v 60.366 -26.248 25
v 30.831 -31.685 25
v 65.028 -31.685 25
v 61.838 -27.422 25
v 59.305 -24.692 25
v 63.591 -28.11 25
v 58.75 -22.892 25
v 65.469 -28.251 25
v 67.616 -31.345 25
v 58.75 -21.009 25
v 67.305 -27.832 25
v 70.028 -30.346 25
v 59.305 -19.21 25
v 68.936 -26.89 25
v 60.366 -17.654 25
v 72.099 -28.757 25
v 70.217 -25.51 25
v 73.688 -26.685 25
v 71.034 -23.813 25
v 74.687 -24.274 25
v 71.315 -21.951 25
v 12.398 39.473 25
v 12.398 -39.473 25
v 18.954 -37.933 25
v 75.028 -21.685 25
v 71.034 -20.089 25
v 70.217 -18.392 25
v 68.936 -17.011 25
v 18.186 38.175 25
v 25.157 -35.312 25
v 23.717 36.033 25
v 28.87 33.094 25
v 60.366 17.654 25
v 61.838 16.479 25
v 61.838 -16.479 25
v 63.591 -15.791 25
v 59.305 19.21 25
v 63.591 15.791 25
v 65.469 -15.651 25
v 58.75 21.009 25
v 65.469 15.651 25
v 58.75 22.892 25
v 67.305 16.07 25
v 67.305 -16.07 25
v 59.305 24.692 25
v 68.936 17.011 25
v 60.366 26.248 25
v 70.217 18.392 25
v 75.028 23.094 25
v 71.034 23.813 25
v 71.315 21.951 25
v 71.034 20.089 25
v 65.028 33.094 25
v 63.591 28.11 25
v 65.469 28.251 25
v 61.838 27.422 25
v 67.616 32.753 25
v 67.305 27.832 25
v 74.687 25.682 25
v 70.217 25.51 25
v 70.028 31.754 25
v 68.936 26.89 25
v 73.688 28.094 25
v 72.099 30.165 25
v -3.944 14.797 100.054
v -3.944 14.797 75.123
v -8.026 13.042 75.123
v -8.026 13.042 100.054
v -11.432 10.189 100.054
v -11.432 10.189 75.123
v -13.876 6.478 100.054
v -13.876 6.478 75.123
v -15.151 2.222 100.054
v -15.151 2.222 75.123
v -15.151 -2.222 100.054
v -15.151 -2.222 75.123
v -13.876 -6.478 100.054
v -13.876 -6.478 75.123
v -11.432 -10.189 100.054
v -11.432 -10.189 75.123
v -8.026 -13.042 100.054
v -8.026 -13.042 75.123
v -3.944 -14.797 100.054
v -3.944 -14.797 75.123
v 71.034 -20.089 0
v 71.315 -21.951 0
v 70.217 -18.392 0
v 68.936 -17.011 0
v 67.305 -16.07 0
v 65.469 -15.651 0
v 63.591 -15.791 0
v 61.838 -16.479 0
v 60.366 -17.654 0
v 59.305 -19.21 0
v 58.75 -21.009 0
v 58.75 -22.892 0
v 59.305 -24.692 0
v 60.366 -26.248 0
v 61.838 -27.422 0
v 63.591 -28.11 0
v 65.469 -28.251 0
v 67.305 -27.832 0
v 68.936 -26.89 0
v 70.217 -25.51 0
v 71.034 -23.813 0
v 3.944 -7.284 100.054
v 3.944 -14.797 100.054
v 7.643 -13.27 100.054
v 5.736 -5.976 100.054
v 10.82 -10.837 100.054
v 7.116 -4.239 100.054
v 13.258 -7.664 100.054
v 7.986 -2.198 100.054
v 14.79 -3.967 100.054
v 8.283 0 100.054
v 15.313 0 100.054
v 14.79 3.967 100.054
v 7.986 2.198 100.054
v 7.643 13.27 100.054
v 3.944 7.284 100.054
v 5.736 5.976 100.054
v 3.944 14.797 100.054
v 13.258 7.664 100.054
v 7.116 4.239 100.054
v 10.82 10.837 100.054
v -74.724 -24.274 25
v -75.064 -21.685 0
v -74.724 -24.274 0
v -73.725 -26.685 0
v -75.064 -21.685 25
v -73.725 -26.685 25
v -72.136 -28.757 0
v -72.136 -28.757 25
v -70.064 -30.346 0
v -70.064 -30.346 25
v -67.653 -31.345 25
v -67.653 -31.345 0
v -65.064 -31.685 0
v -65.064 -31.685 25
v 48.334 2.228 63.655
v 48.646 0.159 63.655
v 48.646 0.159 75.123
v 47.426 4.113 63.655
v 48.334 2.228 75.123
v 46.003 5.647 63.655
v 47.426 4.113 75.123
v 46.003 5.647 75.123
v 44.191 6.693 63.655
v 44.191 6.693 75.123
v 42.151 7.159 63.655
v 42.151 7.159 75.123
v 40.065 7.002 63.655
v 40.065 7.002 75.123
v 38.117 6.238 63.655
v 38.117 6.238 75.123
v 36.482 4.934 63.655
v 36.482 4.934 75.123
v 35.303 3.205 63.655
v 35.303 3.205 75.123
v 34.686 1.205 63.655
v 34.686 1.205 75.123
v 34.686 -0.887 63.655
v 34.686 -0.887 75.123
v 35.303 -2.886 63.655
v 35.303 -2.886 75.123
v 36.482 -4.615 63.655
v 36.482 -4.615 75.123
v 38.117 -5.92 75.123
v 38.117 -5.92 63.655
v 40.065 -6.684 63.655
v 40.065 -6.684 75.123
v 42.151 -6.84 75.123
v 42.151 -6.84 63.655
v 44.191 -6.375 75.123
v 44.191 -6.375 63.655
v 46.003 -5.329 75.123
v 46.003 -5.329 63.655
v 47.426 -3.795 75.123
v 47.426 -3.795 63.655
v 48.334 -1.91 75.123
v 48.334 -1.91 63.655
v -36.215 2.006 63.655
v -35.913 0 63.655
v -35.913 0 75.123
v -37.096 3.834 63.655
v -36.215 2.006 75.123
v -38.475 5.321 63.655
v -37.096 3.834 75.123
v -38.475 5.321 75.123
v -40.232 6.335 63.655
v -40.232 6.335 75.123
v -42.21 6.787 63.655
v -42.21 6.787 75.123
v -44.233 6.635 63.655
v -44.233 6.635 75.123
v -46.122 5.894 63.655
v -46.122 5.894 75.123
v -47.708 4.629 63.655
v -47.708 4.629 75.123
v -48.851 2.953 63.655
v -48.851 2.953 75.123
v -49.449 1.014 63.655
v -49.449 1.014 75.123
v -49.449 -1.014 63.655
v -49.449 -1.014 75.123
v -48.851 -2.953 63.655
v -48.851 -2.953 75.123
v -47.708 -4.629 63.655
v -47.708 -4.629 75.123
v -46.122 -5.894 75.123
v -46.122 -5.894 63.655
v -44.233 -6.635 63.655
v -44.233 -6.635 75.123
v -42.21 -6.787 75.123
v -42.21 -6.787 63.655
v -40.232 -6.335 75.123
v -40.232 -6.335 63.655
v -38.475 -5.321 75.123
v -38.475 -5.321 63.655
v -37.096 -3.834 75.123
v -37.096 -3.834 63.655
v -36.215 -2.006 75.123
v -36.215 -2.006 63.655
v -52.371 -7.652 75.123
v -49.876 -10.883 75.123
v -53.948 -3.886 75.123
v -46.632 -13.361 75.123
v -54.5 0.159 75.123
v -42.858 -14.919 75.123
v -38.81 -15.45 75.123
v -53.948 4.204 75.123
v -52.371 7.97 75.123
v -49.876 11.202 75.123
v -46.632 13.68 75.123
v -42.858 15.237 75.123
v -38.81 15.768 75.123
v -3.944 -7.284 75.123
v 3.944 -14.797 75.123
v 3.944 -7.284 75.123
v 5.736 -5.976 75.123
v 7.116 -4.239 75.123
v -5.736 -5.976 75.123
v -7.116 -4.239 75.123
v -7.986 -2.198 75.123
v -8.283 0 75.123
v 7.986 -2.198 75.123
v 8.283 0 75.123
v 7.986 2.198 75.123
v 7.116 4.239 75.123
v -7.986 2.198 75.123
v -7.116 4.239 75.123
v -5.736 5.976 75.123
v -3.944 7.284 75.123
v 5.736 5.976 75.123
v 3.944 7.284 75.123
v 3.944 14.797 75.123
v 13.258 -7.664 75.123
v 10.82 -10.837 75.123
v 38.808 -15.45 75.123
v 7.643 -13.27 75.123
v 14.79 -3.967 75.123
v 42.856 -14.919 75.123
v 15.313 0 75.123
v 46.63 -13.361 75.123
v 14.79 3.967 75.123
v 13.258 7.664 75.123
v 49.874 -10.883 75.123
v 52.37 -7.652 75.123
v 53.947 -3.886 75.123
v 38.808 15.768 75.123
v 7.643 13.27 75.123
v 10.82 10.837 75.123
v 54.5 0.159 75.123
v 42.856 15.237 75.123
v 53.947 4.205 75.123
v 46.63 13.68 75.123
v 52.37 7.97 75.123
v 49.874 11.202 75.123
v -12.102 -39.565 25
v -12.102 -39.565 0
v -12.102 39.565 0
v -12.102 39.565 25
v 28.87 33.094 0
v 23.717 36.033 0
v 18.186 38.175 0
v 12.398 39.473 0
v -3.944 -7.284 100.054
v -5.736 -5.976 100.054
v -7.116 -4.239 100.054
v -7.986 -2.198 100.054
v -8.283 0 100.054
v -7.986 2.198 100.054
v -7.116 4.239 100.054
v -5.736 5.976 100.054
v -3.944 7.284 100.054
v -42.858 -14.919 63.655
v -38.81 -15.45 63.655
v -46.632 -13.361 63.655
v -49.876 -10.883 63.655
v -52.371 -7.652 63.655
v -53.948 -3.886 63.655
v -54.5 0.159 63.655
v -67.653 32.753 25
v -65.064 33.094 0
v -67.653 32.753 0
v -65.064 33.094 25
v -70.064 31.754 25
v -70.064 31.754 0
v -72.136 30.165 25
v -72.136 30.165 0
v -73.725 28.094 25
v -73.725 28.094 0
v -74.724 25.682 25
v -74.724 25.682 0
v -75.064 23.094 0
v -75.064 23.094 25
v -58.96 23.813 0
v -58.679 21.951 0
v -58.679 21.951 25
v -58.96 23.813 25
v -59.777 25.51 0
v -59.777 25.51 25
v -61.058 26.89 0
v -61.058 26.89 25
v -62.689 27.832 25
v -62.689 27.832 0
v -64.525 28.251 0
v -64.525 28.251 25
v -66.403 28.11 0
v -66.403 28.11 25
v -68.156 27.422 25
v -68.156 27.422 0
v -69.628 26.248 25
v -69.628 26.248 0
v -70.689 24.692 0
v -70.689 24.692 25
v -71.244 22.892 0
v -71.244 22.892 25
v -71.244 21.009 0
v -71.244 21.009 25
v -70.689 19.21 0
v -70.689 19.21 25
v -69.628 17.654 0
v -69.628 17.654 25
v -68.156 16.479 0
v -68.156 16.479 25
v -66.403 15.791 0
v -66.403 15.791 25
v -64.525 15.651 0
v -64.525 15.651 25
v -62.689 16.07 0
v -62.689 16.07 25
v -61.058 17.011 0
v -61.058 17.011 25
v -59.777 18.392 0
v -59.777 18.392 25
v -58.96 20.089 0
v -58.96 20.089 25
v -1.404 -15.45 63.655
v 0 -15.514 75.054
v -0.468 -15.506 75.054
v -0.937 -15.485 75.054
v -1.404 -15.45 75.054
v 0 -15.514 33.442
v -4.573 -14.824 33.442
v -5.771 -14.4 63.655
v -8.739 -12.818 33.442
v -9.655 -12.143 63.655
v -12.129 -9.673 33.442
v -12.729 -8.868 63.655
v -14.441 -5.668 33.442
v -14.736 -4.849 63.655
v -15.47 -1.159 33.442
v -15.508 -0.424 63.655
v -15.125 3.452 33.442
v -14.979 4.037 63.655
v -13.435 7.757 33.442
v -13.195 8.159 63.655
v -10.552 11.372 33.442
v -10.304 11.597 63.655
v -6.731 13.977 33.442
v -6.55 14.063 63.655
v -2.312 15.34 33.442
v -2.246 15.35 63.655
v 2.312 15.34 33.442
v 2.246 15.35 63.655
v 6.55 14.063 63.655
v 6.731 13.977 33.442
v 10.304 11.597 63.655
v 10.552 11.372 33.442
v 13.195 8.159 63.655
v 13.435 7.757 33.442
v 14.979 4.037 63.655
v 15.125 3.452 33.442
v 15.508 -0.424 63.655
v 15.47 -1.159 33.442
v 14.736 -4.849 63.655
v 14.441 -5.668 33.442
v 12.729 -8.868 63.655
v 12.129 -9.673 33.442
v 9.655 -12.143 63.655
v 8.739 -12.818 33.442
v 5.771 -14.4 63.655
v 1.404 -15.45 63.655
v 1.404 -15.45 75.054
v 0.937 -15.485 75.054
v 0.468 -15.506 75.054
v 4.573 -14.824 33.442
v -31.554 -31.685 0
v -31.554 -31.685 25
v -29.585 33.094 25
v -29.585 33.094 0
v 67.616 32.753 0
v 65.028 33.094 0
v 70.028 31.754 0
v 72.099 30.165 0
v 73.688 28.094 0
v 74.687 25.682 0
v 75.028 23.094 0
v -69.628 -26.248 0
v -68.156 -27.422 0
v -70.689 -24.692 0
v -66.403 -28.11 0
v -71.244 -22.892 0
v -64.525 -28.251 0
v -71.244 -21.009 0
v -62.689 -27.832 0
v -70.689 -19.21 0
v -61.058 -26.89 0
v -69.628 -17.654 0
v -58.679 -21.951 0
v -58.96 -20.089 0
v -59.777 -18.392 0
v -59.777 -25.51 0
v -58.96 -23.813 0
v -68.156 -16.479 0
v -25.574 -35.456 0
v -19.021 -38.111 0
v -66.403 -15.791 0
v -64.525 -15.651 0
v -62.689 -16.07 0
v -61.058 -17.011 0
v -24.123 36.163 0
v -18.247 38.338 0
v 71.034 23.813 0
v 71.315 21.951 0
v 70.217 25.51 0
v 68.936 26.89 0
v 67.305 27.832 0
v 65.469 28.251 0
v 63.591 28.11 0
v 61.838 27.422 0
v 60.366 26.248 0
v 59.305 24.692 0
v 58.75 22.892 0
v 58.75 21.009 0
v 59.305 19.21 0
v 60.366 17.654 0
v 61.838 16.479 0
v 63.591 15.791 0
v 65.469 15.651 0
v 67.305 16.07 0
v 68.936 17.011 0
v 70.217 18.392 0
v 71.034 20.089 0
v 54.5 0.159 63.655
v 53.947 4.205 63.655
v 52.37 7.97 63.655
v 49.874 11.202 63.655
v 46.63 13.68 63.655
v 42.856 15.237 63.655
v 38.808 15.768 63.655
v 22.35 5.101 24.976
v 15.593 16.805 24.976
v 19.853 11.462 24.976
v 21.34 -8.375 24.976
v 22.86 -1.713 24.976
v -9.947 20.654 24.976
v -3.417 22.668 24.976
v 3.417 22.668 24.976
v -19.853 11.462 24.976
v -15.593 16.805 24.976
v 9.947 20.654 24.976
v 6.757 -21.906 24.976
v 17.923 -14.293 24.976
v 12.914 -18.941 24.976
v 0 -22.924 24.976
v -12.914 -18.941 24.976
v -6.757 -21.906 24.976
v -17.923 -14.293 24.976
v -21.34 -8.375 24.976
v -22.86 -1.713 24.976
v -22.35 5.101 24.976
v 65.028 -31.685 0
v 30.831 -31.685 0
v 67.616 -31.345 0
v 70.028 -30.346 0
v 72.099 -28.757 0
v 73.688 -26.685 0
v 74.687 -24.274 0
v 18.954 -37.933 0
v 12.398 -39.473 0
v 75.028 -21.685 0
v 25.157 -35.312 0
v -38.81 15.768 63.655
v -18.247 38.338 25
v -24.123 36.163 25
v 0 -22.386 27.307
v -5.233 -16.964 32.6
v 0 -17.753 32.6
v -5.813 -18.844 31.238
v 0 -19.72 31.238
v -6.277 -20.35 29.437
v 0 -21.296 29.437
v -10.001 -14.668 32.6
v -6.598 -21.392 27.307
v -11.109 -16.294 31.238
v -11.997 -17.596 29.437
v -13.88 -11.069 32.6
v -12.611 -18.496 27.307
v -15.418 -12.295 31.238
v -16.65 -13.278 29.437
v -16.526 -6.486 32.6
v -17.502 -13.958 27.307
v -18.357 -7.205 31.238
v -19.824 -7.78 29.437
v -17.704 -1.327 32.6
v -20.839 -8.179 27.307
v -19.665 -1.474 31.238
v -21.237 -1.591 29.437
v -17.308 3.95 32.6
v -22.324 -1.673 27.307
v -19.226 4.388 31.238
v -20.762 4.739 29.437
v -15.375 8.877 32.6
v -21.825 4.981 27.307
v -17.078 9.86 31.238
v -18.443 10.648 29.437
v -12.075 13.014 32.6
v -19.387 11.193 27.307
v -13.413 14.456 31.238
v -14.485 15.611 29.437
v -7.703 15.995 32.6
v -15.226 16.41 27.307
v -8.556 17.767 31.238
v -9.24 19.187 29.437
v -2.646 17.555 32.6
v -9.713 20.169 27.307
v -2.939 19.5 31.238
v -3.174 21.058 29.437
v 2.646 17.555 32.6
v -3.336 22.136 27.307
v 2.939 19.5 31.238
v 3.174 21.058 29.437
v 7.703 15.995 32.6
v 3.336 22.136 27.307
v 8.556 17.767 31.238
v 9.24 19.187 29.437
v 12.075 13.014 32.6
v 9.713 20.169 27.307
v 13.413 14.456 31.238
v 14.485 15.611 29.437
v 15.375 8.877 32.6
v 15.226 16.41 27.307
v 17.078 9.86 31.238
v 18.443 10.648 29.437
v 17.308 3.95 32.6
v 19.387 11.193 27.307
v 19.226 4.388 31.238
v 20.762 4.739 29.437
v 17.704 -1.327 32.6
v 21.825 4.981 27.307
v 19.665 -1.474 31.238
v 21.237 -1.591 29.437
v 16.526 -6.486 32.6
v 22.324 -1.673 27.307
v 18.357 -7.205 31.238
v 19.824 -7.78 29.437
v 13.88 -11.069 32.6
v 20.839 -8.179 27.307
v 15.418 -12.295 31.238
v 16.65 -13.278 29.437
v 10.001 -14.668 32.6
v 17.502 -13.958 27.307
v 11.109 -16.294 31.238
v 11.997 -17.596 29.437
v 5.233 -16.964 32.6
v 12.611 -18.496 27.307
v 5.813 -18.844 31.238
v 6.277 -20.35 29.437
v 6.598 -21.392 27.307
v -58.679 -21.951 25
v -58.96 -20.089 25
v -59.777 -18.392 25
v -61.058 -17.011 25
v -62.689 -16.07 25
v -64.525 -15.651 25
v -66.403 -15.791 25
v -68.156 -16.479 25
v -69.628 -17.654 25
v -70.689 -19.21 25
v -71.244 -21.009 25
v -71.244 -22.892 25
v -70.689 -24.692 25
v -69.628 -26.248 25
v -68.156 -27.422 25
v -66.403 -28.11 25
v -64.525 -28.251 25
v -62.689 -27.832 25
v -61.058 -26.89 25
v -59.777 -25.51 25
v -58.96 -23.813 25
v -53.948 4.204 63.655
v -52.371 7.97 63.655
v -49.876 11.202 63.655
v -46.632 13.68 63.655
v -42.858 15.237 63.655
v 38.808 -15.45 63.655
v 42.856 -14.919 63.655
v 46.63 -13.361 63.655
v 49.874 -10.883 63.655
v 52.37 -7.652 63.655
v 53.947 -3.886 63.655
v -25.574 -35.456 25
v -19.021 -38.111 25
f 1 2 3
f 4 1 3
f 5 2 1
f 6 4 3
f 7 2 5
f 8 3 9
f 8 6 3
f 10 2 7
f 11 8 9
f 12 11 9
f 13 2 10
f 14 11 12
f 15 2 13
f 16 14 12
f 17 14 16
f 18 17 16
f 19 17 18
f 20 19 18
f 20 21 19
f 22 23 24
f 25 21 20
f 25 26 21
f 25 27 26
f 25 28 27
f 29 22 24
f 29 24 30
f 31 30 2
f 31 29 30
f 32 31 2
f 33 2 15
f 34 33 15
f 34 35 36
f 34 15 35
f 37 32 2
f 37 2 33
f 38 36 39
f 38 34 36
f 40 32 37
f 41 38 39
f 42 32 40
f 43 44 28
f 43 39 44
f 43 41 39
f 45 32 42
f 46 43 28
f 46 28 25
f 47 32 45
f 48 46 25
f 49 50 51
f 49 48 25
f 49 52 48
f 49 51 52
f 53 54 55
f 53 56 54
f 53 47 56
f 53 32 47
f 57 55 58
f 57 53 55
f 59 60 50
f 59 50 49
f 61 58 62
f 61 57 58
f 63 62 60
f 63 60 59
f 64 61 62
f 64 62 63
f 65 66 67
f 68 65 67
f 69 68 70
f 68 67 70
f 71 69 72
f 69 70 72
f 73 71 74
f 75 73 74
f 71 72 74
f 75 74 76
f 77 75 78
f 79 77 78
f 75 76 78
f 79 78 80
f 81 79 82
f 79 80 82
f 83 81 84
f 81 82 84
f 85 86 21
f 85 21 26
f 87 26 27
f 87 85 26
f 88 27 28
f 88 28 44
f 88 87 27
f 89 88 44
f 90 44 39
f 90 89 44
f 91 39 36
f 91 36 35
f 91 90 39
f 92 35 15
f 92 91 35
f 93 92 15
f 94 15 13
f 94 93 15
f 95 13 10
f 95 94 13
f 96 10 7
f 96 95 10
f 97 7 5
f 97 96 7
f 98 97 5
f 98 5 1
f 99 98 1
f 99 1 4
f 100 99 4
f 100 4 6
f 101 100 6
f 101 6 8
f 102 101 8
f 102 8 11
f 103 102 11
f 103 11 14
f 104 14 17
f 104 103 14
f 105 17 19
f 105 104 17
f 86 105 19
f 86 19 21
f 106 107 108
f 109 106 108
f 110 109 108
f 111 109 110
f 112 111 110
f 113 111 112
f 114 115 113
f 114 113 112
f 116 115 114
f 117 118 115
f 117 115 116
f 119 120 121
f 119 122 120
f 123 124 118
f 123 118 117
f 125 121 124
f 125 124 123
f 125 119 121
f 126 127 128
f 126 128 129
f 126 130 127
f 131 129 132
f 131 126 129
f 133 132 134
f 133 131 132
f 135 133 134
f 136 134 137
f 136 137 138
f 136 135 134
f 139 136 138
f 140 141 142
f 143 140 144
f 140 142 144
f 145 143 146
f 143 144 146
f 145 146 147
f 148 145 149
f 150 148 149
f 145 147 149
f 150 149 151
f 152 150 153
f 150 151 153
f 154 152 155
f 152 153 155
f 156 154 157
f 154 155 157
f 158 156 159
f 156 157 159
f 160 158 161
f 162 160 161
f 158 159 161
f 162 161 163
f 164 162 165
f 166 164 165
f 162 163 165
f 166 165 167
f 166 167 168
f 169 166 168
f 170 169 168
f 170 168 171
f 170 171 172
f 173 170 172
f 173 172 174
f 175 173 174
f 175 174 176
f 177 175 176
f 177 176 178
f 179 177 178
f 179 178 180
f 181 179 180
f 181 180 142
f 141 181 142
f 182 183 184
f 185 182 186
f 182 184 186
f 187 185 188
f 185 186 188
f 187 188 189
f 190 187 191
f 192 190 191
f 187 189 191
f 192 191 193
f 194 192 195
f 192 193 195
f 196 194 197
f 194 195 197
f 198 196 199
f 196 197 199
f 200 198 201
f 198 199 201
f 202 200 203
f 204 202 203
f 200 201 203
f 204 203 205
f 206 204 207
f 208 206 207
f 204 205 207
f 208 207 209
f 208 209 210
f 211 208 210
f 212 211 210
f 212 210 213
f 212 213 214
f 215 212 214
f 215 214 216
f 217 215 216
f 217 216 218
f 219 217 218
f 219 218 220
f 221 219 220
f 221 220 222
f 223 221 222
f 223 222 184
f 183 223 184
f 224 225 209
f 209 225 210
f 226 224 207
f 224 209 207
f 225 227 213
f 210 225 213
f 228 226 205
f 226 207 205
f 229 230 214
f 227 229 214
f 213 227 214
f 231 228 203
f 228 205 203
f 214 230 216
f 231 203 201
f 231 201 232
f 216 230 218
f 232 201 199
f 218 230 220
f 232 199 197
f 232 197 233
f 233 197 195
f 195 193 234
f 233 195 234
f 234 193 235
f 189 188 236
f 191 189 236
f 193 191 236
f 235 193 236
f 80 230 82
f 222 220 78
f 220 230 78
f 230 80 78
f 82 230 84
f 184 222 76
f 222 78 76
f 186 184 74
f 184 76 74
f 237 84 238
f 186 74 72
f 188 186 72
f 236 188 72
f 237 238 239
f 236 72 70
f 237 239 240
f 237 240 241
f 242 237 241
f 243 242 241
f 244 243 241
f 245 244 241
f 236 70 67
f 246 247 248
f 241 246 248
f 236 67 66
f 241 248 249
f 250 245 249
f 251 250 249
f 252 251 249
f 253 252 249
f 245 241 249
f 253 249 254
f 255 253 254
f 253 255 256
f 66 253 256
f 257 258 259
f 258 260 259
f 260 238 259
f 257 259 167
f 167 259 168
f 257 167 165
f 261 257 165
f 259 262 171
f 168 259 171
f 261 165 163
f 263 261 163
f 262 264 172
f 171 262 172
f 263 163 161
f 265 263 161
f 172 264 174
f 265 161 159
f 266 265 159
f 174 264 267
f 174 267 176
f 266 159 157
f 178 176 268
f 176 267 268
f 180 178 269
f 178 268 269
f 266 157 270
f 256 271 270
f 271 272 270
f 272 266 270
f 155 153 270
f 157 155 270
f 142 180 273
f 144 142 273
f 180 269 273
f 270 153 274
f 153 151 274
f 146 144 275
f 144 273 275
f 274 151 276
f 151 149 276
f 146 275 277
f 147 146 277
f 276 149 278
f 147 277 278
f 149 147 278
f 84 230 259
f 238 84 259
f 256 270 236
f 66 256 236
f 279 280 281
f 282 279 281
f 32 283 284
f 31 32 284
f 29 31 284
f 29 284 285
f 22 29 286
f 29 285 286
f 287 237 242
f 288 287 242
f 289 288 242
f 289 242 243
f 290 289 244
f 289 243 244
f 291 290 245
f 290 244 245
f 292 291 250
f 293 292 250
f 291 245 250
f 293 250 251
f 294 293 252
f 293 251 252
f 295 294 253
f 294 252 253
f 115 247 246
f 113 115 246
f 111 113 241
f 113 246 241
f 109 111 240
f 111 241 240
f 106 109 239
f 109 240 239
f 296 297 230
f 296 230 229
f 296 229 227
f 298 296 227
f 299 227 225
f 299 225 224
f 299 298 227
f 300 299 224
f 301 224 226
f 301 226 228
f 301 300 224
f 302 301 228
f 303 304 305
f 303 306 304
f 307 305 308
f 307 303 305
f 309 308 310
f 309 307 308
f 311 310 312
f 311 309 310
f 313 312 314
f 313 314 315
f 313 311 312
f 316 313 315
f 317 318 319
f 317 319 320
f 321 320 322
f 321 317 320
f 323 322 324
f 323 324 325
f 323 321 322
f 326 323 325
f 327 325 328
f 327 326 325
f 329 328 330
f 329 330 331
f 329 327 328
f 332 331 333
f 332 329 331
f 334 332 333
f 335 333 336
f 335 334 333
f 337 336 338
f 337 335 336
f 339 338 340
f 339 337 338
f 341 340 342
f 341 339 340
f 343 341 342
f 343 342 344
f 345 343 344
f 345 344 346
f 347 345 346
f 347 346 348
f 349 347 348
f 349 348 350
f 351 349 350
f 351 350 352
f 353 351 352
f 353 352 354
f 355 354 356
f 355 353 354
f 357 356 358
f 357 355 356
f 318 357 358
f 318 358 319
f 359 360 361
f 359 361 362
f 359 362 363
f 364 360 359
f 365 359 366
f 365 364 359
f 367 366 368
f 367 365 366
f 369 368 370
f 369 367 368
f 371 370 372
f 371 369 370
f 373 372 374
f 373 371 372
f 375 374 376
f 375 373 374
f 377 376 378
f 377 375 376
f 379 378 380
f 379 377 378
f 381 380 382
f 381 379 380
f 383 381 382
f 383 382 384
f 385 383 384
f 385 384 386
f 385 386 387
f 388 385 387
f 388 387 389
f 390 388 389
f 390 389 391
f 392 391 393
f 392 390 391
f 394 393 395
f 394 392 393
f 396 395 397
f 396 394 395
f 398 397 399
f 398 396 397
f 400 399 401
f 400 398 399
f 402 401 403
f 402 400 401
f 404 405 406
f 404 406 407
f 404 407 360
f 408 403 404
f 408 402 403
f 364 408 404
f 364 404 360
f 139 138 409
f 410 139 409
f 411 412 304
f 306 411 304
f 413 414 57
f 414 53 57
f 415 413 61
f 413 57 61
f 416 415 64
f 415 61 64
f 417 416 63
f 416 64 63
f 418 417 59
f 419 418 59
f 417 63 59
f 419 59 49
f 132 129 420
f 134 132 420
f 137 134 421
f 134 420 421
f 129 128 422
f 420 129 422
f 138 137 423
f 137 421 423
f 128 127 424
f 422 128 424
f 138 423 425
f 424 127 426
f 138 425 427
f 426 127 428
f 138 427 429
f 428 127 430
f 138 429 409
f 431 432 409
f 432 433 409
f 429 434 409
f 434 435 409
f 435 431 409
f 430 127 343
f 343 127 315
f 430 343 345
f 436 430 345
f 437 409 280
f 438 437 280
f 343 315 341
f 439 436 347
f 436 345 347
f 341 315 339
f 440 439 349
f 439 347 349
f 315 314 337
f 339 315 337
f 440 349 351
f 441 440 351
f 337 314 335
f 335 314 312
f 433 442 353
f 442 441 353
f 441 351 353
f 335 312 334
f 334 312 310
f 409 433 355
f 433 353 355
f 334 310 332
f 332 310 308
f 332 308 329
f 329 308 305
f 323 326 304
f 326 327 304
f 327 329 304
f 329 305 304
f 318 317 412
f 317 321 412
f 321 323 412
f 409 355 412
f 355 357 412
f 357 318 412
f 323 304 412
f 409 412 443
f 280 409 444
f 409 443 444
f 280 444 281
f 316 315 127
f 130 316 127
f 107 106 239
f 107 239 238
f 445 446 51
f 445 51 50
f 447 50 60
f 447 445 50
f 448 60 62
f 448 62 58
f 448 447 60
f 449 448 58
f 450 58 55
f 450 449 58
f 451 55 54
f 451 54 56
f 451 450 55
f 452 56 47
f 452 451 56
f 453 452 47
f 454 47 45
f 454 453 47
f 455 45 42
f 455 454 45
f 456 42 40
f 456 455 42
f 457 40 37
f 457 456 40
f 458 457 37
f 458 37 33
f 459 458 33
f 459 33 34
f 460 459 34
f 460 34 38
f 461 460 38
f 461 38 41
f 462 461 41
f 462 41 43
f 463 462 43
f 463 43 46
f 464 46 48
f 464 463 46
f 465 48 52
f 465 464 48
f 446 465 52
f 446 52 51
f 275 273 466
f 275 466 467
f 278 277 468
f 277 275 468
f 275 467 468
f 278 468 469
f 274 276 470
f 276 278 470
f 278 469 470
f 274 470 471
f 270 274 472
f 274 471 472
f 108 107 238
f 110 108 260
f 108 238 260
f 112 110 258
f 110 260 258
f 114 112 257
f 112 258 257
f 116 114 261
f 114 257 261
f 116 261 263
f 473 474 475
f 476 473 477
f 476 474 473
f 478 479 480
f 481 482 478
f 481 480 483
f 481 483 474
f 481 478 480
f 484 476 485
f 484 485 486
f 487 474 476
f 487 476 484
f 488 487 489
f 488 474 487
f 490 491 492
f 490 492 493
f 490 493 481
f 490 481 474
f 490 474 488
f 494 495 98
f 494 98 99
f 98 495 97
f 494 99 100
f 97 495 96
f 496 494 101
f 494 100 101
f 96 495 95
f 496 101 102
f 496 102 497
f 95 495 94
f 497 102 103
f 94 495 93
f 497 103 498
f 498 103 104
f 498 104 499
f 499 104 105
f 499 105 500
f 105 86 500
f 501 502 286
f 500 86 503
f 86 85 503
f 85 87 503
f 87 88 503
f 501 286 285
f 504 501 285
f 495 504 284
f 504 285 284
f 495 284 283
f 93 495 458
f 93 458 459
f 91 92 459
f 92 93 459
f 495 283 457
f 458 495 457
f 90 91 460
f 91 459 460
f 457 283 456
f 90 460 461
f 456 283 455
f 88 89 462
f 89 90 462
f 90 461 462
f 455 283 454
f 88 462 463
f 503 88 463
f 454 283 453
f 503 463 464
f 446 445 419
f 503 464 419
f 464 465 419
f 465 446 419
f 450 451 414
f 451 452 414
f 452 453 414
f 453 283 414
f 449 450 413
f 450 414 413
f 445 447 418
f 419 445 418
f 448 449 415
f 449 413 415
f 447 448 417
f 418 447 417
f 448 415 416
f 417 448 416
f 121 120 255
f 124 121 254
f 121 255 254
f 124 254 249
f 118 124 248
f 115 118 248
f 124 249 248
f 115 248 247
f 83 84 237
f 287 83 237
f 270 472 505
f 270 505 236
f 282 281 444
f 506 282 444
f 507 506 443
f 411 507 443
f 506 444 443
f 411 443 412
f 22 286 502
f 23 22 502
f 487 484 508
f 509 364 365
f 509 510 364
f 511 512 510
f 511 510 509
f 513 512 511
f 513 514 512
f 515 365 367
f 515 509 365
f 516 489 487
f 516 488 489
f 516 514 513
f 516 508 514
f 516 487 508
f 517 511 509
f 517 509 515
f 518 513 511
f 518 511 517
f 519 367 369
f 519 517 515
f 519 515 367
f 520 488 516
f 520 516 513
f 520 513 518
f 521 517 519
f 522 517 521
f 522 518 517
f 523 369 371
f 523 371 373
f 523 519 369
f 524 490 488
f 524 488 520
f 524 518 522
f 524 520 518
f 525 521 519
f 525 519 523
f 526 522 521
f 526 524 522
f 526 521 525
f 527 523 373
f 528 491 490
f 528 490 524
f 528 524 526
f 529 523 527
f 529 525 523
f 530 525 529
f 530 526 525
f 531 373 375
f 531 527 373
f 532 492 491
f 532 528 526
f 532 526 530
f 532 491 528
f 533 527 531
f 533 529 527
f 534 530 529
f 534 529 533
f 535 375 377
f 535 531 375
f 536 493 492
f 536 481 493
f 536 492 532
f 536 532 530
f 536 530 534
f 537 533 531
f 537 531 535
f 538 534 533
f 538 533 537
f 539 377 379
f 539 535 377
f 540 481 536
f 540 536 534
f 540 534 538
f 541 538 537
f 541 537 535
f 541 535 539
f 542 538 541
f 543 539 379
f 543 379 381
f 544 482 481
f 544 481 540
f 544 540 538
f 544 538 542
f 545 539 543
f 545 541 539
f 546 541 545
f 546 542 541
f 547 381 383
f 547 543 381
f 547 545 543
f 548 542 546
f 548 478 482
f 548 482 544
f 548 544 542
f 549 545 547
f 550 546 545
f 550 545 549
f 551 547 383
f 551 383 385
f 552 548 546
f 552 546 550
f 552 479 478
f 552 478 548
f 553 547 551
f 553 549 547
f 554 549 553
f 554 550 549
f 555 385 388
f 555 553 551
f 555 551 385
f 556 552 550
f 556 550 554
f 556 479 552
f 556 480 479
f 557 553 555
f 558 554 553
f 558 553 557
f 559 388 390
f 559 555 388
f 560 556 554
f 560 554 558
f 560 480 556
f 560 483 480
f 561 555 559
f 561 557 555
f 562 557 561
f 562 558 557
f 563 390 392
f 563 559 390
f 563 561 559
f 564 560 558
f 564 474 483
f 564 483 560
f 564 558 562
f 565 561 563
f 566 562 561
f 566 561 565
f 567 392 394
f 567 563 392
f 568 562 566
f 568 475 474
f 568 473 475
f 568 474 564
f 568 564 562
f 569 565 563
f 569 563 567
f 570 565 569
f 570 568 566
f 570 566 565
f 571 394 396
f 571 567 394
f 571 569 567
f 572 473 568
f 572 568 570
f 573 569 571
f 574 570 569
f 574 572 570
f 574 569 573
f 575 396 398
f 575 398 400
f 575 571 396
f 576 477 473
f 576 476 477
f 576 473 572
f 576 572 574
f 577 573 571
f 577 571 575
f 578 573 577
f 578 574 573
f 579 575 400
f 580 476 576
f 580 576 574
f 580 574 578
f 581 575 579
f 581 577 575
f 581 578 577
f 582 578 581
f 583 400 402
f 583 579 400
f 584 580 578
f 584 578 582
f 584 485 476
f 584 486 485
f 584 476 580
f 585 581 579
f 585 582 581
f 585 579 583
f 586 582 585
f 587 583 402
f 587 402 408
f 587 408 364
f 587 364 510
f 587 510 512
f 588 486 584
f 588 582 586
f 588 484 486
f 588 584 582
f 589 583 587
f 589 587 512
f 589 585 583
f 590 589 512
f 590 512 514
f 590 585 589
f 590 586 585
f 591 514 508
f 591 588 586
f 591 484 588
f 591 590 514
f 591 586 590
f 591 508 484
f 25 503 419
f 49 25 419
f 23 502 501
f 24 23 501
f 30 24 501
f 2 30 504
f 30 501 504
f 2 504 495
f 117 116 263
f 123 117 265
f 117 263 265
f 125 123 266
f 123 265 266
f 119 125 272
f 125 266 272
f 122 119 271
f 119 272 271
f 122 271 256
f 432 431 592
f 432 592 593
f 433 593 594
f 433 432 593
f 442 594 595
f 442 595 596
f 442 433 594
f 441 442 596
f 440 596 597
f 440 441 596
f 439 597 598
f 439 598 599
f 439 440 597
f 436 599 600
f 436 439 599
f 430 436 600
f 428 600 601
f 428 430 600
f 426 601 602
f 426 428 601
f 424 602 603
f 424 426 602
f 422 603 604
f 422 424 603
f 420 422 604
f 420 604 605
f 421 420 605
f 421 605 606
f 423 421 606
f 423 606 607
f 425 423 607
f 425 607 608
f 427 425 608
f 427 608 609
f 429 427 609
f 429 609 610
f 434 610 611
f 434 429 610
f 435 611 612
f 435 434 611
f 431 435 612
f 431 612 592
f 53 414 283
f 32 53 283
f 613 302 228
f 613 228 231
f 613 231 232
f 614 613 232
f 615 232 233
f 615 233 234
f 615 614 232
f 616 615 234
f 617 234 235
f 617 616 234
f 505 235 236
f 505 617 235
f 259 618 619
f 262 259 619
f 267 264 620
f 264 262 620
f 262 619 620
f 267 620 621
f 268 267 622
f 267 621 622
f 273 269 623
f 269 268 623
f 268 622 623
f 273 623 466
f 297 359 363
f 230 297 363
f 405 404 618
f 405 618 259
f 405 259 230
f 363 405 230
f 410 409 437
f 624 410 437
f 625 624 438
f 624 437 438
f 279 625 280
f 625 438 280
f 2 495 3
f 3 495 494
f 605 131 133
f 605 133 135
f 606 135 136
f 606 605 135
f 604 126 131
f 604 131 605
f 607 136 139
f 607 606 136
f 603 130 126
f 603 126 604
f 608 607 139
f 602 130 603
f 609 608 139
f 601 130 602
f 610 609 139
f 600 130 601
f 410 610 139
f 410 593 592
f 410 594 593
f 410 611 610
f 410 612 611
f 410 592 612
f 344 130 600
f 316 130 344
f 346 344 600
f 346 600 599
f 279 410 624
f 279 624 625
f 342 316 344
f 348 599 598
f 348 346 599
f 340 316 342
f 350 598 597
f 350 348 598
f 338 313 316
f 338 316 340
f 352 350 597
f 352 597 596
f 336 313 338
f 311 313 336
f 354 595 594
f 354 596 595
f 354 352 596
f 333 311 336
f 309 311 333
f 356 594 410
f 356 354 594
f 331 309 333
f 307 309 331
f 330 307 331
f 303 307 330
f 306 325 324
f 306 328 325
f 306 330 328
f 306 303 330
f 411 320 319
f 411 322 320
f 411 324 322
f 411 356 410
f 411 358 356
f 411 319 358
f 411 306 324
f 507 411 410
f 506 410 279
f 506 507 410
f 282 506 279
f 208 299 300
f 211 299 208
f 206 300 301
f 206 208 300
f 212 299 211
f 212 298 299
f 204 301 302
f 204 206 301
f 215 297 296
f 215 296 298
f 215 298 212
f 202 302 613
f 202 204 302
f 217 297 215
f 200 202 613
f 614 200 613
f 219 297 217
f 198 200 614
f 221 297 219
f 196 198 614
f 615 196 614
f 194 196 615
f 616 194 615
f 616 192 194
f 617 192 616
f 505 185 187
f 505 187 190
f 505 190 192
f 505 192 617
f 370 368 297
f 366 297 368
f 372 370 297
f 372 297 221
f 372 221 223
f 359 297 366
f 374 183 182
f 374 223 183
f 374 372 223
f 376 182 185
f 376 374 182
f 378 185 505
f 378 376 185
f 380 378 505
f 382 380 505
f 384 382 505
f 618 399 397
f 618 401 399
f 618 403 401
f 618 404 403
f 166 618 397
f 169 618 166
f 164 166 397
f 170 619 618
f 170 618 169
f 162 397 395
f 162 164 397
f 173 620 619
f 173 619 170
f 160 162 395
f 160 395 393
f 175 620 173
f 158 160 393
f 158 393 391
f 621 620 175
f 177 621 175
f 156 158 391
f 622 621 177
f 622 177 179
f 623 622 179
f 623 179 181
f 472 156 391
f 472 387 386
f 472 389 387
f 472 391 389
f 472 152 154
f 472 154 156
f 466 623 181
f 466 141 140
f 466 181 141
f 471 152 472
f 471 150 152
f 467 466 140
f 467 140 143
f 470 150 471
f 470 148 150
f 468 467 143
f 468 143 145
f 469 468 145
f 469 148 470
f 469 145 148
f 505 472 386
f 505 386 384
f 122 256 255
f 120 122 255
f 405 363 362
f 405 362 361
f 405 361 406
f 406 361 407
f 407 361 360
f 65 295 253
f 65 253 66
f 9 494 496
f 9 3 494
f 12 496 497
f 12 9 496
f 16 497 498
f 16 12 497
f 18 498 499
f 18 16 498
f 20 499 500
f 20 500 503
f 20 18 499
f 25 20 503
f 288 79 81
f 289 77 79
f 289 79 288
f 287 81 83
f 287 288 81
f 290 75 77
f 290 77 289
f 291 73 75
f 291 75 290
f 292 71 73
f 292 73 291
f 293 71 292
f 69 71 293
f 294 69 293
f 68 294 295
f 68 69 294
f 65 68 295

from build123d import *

# Parameters (mm, degrees)
F0_R         = 6.3177385631
F1_DEPTH     = 25
F2_R         = 10
F2_2_R       = 10
F6_DEPTH     = 25
F7_W         = 31.2184179202
F7_H         = 11.4679858088
F8_DEPTH     = 54.5
F9_T1_DEPTH  = 89.929926586
F10_T1_DEPTH = 89.9179858088
F11_R        = 6.8058684083
F11_R_2      = 7.0192014004
F12_DEPTH    = 14.5


# Not quite as in the source:
# - a fillet or chamfer that OpenCascade refuses, or shapes differently, is made with other operations: its cross-section is extruded or revolved along the edge and cut away or added


with BuildPart() as f1:
    # F0 (on Top) → F1 (new body)
    with BuildSketch(Plane.XY):
        with BuildLine():
            Line((-29.585074326, 33.0942198634), (-75.0644803047, 33.0942198634))
            Line((-75.0644803047, 33.0942198634), (-75.0644803047, -31.6854342818))
            Line((-75.0644803047, -31.6854342818), (-31.5542415078, -31.6854342818))
            ThreePointArc((-31.5542415078, -31.6854342818), (-47.222641265, 1.2106089588), (-29.585074326, 33.0942198634))
        make_face()
        with Locations((-64.9971365929, -21.9507273287)):
            Circle(F0_R, mode=Mode.SUBTRACT)
        with Locations((-64.9971365929, 21.9507273287)):
            Circle(F0_R, mode=Mode.SUBTRACT)
        with BuildLine():
            ThreePointArc((-12.1024890528, 39.5649749036), (-21.2275389144, 37.3664266823), (-29.585074326, 33.0942198634))
            Line((-29.585074326, 33.0942198634), (-12.1024890528, 33.0942198634))
            Line((-12.1024890528, 33.0942198634), (-12.1024890528, 39.5649749036))
        make_face()
        with BuildLine():
            Line((-12.1024890528, 33.0942198634), (-29.585074326, 33.0942198634))
            ThreePointArc((-29.585074326, 33.0942198634), (-47.222641265, 1.2106089588), (-31.5542415078, -31.6854342818))
            Line((-31.5542415078, -31.6854342818), (-12.1024890528, -31.6854342818))
            Line((-12.1024890528, -31.6854342818), (-12.1024890528, 33.0942198634))
        make_face()
        with BuildLine():
            Line((-12.1024890528, -31.6854342818), (-31.5542415078, -31.6854342818))
            ThreePointArc((-31.5542415078, -31.6854342818), (-22.3564909939, -36.9289570753), (-12.1024890528, -39.5649749036))
            Line((-12.1024890528, -39.5649749036), (-12.1024890528, -31.6854342818))
        make_face()
    extrude(amount=F1_DEPTH)

    # F2
    f2_edges = [f1.edges().sort_by_distance(p)[0] for p in [
        (-75.06448, 33.09422, 12.5),
        (-75.06448, -31.685434, 12.5),
    ]]
    fillet(f2_edges, radius=F2_R)


with BuildPart() as f1b:
    # F0 (on Top) → F1, piece 2 (new body)
    with BuildSketch(Plane.XY):
        with BuildLine():
            Line((75.027666986, 22.9723975062), (75.027666986, 33.0942198634))
            Line((75.027666986, 33.0942198634), (28.8700831713, 33.0942198634))
            ThreePointArc((28.8700831713, 33.0942198634), (46.4635935741, 1.2073128731), (30.8311391826, -31.6854342818))
            Line((30.8311391826, -31.6854342818), (75.027666986, -31.6854342818))
            Line((75.027666986, -31.6854342818), (75.027666986, -23.3383905143))
            Line((75.027666986, -23.3383905143), (75.027666986, 22.9723975062))
        make_face()
        with Locations((64.9971365929, -21.9507273287)):
            Circle(F0_R, mode=Mode.SUBTRACT)
        with Locations((64.9971365929, 21.9507273287)):
            Circle(F0_R, mode=Mode.SUBTRACT)
        with BuildLine():
            ThreePointArc((30.8311391826, -31.6854342818), (46.4635935741, 1.2073128731), (28.8700831713, 33.0942198634))
            Line((28.8700831713, 33.0942198634), (12.3979339147, 33.0942198634))
            Line((12.3979339147, 33.0942198634), (12.3979339147, -31.6854342818))
            Line((12.3979339147, -31.6854342818), (30.8311391826, -31.6854342818))
        make_face()
        with BuildLine():
            Line((12.3979339147, 33.0942198634), (28.8700831713, 33.0942198634))
            ThreePointArc((28.8700831713, 33.0942198634), (20.991464616, 37.2068208279), (12.3979339147, 39.4733924947))
            Line((12.3979339147, 39.4733924947), (12.3979339147, 33.0942198634))
        make_face()
        with BuildLine():
            ThreePointArc((12.3979339147, -39.4733924947), (22.1107023598, -36.7537810458), (30.8311391826, -31.6854342818))
            Line((30.8311391826, -31.6854342818), (12.3979339147, -31.6854342818))
            Line((12.3979339147, -31.6854342818), (12.3979339147, -39.4733924947))
        make_face()
    extrude(amount=F1_DEPTH)

    # F2#2
    f2_2_edges = [f1b.edges().sort_by_distance(p)[0] for p in [
        (75.027667, 33.09422, 12.5),
        (75.027667, -31.685434, 12.5),
    ]]
    fillet(f2_2_edges, radius=F2_2_R)


with BuildPart() as f4:
    # F3 (on Right) → F4 (revolve)
    with BuildSketch(Plane.YZ):
        with BuildLine():
            Line((-15.5135737732, 24.9761715531), (-15.5135737732, 33.4417130729))
            ThreePointArc((-15.5135737732, 33.4417130729), (-20.5636997877, 30.386116132), (-22.924408385, 24.9761715531))
            Line((-22.924408385, 24.9761715531), (-15.5135737732, 24.9761715531))
        make_face()
        Polygon((0, 24.9761715531), (0, 75.0537067652), (-15.5135737732, 75.0537067652), (-15.5135737732, 33.4417130729), (-15.5135737732, 24.9761715531), align=None)
    revolve(axis=Axis((0, 0, 50.0149391592), (0, 0, -1)))

    # F5 (on face) → F6 (join)
    with BuildSketch(Plane.XY.offset(75.0537067652)):
        with BuildLine():
            ThreePointArc((-3.94382999, -7.2839486676), (-8.2830974389, 0), (-3.94382999, 7.2839486676))
            Line((-3.94382999, 7.2839486676), (-3.94382999, 14.7966654673))
            ThreePointArc((-3.94382999, 14.7966654673), (-15.3132329683, 0), (-3.94382999, -14.7966654673))
            Line((-3.94382999, -14.7966654673), (-3.94382999, -7.2839486676))
        make_face()
        with BuildLine():
            ThreePointArc((3.94382999, 7.2839486676), (7.1160674277, 4.2392555415), (8.2830974389, 0))
            ThreePointArc((8.2830974389, 0), (7.1160674277, -4.2392555415), (3.94382999, -7.2839486676))
            Line((3.94382999, -7.2839486676), (3.94382999, -14.7966654673))
            ThreePointArc((3.94382999, -14.7966654673), (12.1426498625, -9.3301210206), (15.3132329683, 0))
            ThreePointArc((15.3132329683, 0), (12.1426498625, 9.3301210206), (3.94382999, 14.7966654673))
            Line((3.94382999, 14.7966654673), (3.94382999, 7.2839486676))
        make_face()
    extrude(amount=F6_DEPTH)

    # F7 (on Right) → F8 (join, symmetric)
    with BuildSketch(Plane.YZ):
        with Locations((0.1592780463, 69.3889670074)):
            Rectangle(F7_W, F7_H)
    extrude(amount=F8_DEPTH, both=True)

    # F9: fillet of radius 15.6923881554 on 2 edges, made by hand

    # F9_s2 → F9_t1 (cut)
    with BuildSketch(Plane.XY.offset(24.4240037144)):
        with BuildLine():
            ThreePointArc((38.8076118446, -15.4499309137), (49.9038059223, -10.853736836), (54.5, 0.2424572417))
            Line((54.5, 0.2424572417), (54.5, -15.4499309137))
            Line((54.5, -15.4499309137), (38.8076118446, -15.4499309137))
        make_face()
        with BuildLine():
            ThreePointArc((54.5, 0.076098851), (49.9038059223, 11.1722929287), (38.8076118446, 15.7684870064))
            Line((38.8076118446, 15.7684870064), (54.5, 15.7684870064))
            Line((54.5, 15.7684870064), (54.5, 0.076098851))
        make_face()
    extrude(amount=F9_T1_DEPTH, mode=Mode.SUBTRACT)

    # F10: fillet of radius 15.69 on 2 edges, made by hand

    # F10_s2 → F10_t1 (cut)
    with BuildSketch(Plane.XY.offset(24.429974103)):
        with BuildLine():
            ThreePointArc((-38.81, -15.4499309137), (-49.9045053968, -10.8544363106), (-54.5, 0.2400690863))
            Line((-54.5, 0.2400690863), (-54.5, -15.4499309137))
            Line((-54.5, -15.4499309137), (-38.81, -15.4499309137))
        make_face()
        with BuildLine():
            ThreePointArc((-54.5, 0.0784870064), (-49.9045053968, 11.1729924032), (-38.81, 15.7684870064))
            Line((-38.81, 15.7684870064), (-54.5, 15.7684870064))
            Line((-54.5, 15.7684870064), (-54.5, 0.0784870064))
        make_face()
    extrude(amount=F10_T1_DEPTH, mode=Mode.SUBTRACT)

    # F11 (on face) → F12 (cut)
    with BuildSketch(Plane.XY.offset(75.1229599118)):
        with Locations((-42.7188128233, 0)):
            Circle(F11_R)
        with Locations((41.626945138, 0.1592780463)):
            Circle(F11_R_2)
    extrude(amount=-F12_DEPTH, mode=Mode.SUBTRACT)


solid = Compound([f1.part, f1b.part, f4.part])
